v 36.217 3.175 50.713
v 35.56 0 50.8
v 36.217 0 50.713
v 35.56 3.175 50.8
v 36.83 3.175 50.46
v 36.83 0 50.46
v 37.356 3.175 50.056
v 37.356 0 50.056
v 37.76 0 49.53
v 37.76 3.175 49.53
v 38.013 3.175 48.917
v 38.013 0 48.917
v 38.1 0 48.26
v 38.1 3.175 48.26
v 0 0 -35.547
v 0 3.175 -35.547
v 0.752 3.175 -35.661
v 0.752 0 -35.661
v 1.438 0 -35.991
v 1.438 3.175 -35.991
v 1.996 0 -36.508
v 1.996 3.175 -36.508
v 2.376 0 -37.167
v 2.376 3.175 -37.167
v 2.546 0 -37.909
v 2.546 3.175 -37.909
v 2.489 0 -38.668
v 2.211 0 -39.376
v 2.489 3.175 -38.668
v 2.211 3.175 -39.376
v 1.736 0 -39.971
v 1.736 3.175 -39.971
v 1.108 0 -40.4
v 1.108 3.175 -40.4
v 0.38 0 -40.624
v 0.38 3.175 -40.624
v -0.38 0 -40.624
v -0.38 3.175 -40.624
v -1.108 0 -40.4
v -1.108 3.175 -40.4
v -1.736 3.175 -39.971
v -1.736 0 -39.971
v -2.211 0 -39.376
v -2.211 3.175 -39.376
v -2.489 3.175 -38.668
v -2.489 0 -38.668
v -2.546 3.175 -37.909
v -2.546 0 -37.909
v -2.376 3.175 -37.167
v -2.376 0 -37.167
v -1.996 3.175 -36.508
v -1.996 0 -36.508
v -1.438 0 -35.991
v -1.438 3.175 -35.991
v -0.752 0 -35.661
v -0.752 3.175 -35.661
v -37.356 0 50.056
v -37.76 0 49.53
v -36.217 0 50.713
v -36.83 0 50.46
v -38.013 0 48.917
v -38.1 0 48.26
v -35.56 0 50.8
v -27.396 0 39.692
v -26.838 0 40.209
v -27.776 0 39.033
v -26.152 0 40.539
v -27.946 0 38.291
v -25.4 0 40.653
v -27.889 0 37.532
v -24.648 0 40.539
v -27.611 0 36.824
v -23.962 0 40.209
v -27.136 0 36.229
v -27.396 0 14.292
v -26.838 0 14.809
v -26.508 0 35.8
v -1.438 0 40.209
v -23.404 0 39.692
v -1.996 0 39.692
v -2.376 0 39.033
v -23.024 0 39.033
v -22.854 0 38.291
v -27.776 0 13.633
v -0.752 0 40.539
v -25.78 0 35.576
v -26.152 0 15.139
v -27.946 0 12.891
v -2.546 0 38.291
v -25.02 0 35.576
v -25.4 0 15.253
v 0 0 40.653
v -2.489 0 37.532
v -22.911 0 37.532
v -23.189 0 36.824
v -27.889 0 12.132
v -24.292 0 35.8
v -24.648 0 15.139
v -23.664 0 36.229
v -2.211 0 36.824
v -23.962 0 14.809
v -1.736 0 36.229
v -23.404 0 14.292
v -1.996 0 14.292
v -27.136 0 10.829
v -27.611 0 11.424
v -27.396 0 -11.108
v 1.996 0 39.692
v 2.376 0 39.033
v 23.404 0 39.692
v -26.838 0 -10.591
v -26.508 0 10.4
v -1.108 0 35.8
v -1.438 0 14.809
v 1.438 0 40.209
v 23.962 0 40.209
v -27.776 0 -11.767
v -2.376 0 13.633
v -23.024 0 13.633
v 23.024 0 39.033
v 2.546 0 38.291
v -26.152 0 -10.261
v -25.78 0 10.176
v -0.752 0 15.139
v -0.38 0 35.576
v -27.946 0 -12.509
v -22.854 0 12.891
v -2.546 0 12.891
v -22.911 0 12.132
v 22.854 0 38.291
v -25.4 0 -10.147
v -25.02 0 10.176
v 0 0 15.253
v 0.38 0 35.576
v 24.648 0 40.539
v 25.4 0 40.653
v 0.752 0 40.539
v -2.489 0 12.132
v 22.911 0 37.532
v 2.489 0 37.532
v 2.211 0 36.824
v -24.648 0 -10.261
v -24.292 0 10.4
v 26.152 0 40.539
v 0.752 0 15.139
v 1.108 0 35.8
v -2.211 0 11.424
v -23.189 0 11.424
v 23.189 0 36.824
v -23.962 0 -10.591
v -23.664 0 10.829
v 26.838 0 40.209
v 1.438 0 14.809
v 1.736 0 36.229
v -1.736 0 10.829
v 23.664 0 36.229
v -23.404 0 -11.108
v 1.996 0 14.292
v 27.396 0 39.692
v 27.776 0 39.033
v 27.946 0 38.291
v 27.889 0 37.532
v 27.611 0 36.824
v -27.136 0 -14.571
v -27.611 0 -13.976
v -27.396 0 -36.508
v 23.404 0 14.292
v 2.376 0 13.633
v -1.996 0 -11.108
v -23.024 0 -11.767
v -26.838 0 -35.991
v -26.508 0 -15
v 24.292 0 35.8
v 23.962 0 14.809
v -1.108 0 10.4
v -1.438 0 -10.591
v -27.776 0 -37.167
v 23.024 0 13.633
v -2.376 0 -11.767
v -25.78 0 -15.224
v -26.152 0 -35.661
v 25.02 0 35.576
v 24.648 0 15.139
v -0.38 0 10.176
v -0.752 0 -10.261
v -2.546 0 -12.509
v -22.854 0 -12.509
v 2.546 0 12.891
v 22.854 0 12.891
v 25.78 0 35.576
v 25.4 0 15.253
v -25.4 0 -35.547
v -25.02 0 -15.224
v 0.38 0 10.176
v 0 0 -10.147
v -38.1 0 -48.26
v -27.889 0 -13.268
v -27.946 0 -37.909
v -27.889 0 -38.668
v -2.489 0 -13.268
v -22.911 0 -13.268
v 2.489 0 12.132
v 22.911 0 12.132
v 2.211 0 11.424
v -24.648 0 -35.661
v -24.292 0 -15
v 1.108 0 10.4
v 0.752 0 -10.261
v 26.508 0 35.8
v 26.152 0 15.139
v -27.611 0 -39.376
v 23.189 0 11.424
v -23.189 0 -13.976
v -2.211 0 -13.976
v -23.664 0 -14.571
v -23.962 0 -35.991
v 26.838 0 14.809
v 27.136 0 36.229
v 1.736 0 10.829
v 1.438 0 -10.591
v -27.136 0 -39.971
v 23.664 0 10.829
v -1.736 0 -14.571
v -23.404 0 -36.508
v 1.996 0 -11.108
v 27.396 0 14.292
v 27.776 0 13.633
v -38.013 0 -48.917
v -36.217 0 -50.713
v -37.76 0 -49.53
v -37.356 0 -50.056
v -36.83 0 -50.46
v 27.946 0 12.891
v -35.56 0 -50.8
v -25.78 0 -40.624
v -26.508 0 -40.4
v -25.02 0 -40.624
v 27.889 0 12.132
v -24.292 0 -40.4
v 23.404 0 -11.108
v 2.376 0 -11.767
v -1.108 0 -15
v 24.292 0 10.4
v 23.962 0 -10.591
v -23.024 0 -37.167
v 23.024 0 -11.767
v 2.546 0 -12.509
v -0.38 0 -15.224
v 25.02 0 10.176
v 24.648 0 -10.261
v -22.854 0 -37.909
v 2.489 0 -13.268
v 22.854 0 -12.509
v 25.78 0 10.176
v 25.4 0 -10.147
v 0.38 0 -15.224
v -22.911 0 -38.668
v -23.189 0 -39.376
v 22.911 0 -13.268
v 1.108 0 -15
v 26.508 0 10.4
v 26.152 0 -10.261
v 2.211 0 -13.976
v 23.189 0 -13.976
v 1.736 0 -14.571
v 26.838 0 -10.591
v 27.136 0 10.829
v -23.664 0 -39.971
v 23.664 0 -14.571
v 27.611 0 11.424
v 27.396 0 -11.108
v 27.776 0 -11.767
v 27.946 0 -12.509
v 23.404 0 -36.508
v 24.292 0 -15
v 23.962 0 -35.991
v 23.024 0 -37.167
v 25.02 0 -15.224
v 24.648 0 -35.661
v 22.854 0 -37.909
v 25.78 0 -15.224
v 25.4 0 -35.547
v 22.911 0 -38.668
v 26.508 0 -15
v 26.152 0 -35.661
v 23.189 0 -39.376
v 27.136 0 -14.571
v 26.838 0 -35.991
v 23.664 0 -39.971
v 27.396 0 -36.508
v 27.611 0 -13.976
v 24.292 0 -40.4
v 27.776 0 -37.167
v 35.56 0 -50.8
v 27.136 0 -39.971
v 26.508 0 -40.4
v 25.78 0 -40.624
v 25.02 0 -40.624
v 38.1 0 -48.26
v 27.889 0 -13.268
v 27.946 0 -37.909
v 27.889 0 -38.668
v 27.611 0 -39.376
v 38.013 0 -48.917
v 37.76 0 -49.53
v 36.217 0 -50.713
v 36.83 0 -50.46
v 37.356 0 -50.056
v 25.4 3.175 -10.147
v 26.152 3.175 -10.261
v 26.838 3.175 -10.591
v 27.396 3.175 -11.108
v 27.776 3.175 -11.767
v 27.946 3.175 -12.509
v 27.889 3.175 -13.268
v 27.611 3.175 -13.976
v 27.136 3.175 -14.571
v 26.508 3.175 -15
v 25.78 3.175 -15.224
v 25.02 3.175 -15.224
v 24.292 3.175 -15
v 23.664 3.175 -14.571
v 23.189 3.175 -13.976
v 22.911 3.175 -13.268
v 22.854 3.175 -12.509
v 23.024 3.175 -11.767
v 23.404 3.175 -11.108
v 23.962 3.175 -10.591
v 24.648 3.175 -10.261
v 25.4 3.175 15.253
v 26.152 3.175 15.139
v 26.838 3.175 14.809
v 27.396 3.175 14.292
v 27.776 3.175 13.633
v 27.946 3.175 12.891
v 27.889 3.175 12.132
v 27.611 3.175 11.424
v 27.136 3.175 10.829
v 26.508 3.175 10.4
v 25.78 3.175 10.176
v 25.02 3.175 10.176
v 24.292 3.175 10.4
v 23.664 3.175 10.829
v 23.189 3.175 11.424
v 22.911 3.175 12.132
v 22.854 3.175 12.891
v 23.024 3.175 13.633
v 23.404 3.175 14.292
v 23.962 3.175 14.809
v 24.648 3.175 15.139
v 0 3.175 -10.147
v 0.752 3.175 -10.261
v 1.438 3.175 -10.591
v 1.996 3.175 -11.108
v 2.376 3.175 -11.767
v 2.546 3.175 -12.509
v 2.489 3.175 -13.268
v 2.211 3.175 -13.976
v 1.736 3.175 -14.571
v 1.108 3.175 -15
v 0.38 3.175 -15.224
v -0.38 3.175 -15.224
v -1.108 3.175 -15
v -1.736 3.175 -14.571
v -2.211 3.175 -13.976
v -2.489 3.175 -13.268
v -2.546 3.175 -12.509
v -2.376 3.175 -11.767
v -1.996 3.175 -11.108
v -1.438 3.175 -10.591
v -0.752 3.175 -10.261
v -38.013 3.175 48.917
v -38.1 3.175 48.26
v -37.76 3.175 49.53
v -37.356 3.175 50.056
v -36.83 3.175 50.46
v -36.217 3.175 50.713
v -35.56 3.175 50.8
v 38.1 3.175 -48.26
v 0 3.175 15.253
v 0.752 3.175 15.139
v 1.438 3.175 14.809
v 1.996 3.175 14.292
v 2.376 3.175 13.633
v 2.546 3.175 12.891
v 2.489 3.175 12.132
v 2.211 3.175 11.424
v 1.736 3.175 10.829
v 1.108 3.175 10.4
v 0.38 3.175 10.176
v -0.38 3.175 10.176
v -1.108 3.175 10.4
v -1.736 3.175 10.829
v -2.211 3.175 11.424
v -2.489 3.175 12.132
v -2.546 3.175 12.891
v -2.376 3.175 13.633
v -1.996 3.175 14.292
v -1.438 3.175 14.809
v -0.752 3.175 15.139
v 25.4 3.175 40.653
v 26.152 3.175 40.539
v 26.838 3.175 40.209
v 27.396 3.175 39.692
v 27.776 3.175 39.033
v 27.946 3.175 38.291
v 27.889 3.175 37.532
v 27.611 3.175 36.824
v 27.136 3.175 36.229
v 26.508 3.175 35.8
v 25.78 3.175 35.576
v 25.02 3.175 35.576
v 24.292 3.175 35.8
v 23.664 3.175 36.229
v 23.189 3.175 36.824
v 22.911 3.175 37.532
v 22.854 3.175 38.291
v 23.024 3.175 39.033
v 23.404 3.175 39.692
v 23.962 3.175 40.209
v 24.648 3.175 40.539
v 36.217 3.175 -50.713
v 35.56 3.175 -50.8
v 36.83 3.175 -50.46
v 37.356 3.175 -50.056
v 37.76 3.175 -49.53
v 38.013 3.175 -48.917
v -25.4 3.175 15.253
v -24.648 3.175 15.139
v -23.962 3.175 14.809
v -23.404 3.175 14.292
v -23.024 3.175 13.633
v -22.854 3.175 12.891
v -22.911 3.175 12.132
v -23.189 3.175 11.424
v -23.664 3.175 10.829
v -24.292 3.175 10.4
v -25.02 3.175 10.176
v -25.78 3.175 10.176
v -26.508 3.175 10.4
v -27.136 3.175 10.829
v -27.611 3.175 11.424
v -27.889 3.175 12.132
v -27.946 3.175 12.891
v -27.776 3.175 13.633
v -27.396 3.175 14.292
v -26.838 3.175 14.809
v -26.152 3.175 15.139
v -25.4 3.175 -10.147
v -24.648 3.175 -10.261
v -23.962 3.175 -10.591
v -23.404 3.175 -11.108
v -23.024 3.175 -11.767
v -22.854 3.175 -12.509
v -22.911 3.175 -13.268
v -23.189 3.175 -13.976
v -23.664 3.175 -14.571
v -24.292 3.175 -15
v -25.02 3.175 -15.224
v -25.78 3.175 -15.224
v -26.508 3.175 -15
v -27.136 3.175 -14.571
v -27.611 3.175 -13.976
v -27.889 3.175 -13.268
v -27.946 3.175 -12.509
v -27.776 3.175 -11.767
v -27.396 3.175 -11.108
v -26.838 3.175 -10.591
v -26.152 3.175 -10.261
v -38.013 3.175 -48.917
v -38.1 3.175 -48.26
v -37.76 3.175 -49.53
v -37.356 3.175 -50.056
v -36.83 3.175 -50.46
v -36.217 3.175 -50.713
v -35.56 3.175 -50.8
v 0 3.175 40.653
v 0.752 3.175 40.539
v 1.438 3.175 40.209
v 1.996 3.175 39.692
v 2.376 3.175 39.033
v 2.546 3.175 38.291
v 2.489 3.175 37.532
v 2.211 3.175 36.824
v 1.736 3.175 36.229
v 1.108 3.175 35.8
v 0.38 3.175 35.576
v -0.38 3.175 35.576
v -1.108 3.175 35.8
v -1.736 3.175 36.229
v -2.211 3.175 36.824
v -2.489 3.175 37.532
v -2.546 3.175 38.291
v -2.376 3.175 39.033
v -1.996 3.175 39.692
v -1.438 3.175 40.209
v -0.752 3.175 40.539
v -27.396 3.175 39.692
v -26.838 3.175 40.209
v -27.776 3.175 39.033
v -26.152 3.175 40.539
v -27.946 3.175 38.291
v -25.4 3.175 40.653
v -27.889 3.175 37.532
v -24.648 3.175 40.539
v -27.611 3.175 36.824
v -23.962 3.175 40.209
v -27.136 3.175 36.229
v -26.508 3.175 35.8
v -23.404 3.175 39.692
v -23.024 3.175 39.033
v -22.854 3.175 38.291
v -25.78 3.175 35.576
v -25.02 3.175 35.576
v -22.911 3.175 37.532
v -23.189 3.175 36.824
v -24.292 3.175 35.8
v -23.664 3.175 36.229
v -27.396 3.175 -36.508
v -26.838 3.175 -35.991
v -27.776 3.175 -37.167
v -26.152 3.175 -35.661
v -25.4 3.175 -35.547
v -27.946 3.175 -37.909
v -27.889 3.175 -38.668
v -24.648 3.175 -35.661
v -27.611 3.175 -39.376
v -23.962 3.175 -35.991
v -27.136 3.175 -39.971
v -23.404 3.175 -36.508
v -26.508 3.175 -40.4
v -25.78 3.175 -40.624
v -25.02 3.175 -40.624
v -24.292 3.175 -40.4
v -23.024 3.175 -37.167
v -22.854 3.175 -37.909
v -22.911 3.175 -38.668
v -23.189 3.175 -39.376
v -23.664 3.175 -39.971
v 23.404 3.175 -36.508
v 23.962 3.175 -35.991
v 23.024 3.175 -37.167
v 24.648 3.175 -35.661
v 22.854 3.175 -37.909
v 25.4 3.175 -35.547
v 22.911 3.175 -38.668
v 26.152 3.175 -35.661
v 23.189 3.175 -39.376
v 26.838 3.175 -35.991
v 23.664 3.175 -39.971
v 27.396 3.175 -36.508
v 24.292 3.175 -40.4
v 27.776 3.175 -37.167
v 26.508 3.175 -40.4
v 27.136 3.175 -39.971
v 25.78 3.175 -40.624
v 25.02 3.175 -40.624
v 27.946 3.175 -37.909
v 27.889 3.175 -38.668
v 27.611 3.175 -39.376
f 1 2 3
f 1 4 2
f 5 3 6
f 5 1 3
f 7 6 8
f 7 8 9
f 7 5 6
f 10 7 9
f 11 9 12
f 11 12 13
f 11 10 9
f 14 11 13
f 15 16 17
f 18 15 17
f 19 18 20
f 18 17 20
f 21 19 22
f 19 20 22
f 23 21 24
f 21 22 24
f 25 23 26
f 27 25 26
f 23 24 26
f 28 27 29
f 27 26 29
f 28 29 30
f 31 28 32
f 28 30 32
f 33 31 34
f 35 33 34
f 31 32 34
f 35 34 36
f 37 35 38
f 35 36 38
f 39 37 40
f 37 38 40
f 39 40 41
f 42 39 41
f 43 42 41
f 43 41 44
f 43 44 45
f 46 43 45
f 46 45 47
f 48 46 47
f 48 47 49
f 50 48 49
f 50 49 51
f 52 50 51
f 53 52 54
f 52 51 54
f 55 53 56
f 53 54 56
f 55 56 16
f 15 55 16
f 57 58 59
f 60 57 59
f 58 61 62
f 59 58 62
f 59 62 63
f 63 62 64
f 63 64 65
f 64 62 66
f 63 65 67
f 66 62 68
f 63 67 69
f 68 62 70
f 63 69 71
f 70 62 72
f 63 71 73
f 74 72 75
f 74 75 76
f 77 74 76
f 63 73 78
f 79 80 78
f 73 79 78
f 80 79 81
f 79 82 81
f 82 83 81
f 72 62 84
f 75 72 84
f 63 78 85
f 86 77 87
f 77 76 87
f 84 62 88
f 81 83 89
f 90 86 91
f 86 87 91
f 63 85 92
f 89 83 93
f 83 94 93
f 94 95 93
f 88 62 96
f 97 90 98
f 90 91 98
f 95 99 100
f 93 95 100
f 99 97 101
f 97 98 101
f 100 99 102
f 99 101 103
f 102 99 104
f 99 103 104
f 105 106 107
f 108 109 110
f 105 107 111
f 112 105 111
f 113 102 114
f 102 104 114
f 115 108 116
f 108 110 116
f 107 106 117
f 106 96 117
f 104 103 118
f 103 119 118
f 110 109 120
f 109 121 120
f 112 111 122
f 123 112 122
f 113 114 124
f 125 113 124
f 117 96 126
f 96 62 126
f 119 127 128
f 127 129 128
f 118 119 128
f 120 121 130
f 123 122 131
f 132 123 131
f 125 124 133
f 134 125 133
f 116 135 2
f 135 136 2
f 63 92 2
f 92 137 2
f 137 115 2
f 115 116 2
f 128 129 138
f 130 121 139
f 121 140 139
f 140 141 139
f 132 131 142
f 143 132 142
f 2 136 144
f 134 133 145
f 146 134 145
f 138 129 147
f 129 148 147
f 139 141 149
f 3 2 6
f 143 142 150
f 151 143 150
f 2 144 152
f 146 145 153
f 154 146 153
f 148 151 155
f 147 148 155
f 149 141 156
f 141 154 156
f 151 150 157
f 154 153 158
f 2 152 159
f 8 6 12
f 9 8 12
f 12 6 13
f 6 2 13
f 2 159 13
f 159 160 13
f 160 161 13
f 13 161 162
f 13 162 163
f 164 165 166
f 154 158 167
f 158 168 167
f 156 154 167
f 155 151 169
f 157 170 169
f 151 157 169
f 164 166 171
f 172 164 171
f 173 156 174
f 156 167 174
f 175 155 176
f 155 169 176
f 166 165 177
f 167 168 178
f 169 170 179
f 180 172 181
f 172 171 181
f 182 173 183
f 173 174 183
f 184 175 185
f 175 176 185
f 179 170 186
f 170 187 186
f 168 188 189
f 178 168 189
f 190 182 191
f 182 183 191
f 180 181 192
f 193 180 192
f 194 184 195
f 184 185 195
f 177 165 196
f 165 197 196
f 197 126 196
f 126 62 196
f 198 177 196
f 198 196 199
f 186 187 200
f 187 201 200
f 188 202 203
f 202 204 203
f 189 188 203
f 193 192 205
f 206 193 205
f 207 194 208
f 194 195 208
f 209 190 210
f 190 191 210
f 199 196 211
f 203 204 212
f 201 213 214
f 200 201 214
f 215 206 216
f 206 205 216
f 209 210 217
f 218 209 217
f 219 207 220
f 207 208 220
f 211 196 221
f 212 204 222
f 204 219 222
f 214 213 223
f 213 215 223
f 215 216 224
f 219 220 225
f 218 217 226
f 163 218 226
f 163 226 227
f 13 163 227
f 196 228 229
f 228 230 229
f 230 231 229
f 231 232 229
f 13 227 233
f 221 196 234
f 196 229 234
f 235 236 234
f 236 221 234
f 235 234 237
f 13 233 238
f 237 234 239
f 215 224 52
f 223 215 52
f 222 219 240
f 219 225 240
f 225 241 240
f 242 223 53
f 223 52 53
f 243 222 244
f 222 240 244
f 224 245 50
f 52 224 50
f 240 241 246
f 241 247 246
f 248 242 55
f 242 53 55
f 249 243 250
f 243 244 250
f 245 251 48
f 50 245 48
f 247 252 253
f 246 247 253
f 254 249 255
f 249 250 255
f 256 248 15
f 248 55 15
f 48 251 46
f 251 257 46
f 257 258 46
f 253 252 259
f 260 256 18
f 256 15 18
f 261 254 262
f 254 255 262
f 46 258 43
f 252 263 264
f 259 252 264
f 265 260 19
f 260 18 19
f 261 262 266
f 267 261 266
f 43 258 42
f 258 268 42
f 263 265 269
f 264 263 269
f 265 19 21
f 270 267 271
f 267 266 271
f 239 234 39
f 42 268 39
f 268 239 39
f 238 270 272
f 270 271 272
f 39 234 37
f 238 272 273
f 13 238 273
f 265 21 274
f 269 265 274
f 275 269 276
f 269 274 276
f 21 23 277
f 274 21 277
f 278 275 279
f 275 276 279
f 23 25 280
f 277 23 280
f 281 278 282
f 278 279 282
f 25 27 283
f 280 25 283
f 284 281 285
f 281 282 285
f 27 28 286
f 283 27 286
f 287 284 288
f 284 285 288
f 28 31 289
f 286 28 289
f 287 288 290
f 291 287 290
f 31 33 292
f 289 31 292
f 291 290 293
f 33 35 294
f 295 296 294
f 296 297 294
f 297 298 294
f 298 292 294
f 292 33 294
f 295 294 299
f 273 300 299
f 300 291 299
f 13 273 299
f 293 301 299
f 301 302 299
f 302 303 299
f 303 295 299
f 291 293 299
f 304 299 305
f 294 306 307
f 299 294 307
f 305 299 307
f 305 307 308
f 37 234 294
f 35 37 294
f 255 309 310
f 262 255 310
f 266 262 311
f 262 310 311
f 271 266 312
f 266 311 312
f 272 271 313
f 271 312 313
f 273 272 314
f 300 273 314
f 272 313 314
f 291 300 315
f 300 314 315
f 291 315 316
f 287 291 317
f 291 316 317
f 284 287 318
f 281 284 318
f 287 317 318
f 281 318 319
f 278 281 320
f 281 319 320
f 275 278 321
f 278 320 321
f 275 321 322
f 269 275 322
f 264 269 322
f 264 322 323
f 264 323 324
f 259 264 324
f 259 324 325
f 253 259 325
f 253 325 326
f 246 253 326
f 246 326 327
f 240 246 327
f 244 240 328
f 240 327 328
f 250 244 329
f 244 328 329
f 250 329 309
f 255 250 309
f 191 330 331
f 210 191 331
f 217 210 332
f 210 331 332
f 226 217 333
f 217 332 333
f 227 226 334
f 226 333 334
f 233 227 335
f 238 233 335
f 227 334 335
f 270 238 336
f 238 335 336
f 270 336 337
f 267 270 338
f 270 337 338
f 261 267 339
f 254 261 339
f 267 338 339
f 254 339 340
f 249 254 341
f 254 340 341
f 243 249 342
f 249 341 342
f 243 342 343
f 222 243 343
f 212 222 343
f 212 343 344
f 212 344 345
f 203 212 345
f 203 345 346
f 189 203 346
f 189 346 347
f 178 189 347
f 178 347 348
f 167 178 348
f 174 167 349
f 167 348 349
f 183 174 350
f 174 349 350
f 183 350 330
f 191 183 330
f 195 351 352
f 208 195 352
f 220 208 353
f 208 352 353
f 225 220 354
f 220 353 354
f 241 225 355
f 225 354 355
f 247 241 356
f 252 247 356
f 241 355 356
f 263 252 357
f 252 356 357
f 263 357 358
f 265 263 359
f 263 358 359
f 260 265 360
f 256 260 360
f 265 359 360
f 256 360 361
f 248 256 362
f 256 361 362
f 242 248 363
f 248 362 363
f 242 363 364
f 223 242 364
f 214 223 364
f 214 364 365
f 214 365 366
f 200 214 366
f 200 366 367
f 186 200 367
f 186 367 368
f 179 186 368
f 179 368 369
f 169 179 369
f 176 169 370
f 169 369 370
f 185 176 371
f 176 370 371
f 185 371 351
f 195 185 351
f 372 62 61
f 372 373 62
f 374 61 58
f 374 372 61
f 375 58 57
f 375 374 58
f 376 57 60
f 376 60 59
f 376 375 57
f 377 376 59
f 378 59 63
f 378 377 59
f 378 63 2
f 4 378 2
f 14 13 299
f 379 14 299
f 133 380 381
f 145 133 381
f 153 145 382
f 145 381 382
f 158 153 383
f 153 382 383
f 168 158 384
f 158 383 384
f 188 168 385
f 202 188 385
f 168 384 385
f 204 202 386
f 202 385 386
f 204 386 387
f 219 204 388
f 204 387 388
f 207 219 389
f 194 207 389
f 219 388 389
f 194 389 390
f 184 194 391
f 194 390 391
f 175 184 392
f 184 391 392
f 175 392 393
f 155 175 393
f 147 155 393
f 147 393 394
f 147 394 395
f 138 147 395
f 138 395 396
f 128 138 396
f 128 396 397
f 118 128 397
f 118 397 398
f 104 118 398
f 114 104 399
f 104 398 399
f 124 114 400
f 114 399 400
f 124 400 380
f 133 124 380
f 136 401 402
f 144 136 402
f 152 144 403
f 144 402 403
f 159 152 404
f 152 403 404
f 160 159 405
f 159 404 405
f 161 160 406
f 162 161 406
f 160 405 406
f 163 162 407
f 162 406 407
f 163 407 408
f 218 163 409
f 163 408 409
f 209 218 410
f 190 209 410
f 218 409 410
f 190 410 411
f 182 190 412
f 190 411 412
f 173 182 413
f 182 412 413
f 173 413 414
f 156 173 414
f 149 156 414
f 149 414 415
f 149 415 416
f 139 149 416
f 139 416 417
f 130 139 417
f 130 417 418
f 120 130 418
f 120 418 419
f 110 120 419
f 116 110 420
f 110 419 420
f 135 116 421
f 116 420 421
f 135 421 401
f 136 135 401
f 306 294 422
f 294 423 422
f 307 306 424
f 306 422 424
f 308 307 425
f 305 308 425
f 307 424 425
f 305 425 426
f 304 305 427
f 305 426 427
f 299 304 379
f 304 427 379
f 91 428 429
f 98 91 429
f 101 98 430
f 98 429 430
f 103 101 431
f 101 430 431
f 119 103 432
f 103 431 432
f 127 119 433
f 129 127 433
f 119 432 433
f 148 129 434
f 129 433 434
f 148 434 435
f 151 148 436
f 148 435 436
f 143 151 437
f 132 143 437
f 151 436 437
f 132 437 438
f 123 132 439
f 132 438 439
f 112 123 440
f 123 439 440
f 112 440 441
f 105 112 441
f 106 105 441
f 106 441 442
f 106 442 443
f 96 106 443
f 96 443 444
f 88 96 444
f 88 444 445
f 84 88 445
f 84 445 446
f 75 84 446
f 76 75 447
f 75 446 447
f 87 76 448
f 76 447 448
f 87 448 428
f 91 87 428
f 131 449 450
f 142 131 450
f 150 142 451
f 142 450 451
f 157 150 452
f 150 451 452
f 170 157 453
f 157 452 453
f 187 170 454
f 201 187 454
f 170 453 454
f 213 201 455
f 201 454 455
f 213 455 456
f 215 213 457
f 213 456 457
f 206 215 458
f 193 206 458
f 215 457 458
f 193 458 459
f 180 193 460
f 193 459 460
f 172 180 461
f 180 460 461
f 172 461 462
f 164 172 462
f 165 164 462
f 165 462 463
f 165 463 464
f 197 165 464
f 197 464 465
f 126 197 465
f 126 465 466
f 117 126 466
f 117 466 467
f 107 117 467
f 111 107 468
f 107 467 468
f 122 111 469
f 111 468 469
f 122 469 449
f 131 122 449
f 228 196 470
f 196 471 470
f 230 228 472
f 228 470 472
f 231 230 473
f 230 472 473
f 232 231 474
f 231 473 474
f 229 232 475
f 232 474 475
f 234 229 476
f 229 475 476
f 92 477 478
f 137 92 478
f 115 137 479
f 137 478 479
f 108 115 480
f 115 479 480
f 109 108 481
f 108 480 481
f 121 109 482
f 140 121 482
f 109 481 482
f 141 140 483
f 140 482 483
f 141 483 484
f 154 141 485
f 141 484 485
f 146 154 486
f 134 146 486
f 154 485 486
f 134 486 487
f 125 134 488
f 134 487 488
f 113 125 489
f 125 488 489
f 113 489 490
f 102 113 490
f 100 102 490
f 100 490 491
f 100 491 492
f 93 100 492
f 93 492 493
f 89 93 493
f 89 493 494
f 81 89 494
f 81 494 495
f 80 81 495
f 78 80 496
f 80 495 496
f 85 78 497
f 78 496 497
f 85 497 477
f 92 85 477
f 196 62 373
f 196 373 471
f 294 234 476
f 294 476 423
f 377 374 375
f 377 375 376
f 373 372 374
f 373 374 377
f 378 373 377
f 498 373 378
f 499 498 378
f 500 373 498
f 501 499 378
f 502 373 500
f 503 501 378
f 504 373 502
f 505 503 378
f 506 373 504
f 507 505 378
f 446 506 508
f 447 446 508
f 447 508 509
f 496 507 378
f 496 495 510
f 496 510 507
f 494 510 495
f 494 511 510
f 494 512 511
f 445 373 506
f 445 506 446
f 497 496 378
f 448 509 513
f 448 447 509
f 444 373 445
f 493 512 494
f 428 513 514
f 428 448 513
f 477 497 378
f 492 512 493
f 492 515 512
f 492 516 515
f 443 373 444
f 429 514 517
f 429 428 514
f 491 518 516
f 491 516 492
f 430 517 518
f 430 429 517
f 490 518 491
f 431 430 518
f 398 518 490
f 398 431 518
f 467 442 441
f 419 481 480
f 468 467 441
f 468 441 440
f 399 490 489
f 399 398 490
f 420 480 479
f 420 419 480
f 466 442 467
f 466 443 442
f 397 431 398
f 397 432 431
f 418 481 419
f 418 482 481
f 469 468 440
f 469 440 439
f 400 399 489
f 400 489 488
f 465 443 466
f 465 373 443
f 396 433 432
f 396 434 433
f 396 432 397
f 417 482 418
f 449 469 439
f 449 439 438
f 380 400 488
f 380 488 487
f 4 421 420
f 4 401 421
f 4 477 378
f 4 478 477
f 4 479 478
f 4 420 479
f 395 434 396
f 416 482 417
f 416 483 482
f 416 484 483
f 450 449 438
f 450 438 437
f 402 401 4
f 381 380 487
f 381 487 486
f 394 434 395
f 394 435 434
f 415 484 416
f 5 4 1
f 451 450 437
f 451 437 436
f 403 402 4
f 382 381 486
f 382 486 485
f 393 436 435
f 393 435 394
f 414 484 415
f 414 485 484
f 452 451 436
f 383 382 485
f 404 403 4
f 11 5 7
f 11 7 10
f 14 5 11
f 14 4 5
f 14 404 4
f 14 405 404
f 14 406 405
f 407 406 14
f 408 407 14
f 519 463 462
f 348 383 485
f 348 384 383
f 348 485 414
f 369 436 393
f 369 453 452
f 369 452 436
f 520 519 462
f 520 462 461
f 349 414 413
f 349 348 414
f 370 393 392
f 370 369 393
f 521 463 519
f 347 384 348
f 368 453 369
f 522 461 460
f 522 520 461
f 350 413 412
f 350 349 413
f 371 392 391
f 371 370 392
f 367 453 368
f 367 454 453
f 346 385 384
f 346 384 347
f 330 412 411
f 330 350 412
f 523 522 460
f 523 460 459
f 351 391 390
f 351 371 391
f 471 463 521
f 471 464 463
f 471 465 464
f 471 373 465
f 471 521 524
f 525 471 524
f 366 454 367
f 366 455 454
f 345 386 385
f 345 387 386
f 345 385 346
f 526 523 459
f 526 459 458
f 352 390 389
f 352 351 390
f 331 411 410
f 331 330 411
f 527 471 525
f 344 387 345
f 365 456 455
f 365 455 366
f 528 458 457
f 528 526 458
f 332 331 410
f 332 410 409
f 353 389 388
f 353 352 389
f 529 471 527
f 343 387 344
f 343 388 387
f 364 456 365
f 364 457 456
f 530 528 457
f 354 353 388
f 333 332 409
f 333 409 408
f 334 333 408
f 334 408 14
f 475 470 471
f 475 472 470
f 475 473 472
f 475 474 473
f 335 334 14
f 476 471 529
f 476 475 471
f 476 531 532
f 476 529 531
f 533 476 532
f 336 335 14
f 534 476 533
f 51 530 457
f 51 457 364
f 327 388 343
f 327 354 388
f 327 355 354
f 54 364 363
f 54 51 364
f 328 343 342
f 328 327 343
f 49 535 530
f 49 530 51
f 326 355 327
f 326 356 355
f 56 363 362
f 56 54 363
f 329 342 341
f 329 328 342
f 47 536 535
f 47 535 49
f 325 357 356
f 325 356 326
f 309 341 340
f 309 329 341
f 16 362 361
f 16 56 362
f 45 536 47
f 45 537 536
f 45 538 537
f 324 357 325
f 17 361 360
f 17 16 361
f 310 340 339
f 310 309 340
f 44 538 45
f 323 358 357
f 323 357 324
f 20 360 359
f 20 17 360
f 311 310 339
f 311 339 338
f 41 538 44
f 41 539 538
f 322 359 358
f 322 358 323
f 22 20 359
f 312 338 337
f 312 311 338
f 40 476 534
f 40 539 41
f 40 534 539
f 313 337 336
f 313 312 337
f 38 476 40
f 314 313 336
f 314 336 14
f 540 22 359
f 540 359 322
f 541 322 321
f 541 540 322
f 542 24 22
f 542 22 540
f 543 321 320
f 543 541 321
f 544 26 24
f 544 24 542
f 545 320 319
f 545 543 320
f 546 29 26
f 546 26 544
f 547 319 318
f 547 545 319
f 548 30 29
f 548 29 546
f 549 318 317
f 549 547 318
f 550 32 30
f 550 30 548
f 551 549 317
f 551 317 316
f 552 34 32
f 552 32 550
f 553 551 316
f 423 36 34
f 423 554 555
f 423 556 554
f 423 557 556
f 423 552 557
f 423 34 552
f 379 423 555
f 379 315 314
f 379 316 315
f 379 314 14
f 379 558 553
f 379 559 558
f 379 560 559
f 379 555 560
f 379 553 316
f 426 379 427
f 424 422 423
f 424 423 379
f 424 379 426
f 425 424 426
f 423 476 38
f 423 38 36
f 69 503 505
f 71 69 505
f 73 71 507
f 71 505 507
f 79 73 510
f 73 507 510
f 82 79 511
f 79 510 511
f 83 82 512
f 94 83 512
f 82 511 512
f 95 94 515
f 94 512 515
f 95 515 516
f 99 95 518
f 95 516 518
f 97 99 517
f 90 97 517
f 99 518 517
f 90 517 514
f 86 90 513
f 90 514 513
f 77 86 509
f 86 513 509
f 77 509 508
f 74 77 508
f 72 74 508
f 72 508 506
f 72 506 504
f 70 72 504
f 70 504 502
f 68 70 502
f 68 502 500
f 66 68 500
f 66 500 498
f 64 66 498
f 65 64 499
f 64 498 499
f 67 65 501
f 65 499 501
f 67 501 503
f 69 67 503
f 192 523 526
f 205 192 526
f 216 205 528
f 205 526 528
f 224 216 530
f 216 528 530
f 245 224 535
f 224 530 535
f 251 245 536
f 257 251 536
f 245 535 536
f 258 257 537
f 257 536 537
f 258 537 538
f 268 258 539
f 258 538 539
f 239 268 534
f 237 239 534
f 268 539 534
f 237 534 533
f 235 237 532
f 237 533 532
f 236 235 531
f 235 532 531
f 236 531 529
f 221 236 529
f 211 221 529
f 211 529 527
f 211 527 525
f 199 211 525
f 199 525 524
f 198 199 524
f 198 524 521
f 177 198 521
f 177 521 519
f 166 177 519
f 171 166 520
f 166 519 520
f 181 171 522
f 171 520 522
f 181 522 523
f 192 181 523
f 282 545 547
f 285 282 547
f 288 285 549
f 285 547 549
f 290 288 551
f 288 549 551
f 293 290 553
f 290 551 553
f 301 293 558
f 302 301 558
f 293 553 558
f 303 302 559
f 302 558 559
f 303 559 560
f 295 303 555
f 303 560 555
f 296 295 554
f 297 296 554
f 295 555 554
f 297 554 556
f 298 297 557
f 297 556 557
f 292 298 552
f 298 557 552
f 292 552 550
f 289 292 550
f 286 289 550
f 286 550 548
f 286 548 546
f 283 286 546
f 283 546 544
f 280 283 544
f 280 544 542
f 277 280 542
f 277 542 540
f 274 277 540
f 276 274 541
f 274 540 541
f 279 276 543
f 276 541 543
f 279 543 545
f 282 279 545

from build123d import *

# Parameters (mm, degrees)
SKETCH1_W            = 76.2
SKETCH1_H            = 101.6
BOSS_EXTRUDE1_DEPTH  = 3.175
SKETCH2_R            = 2.5527
CUT_EXTRUDE1_DEPTH   = 3.175
LPATTERN1_COUNT      = 4
LPATTERN1_PITCH      = 25.4
LPATTERN1_COUNT_DIR2 = 3
LPATTERN1_PITCH_DIR2 = 25.4
FILLET1_R            = 2.54


with BuildPart() as part:
    # Sketch1 → Boss-Extrude1 (new body)
    with BuildSketch(Plane(origin=(0, 0, 0), x_dir=(1, 0, 0), z_dir=(0, 1, 0))):
        Rectangle(SKETCH1_W, SKETCH1_H)
    extrude(amount=BOSS_EXTRUDE1_DEPTH)

    # Sketch2 → Cut-Extrude1 (cut)
    with BuildSketch(Plane(origin=(0, 3.175, 0), x_dir=(1, 0, 0), z_dir=(0, 1, 0))):
        with Locations(Location((-25.4, -38.1, 0), (0, 0, 270))):
            Circle(SKETCH2_R)
    cut_extrude1 = extrude(amount=-CUT_EXTRUDE1_DEPTH, mode=Mode.SUBTRACT)

    # LPattern1: Cut-Extrude1 4 × 3
    with Locations(*[(j * LPATTERN1_PITCH_DIR2, 0, -i * LPATTERN1_PITCH) for i in range(LPATTERN1_COUNT) for j in range(LPATTERN1_COUNT_DIR2) if (i, j) != (0, 0)]):
        add(cut_extrude1, mode=Mode.SUBTRACT)

    # Fillet1
    fillet1_edges = [part.edges().sort_by_distance(p)[0] for p in [
        (38.1, 1.5875, 50.8),
        (-38.1, 1.5875, 50.8),
        (-38.1, 1.5875, -50.8),
        (38.1, 1.5875, -50.8),
    ]]
    fillet(fillet1_edges, radius=FILLET1_R)


solid = part.part
